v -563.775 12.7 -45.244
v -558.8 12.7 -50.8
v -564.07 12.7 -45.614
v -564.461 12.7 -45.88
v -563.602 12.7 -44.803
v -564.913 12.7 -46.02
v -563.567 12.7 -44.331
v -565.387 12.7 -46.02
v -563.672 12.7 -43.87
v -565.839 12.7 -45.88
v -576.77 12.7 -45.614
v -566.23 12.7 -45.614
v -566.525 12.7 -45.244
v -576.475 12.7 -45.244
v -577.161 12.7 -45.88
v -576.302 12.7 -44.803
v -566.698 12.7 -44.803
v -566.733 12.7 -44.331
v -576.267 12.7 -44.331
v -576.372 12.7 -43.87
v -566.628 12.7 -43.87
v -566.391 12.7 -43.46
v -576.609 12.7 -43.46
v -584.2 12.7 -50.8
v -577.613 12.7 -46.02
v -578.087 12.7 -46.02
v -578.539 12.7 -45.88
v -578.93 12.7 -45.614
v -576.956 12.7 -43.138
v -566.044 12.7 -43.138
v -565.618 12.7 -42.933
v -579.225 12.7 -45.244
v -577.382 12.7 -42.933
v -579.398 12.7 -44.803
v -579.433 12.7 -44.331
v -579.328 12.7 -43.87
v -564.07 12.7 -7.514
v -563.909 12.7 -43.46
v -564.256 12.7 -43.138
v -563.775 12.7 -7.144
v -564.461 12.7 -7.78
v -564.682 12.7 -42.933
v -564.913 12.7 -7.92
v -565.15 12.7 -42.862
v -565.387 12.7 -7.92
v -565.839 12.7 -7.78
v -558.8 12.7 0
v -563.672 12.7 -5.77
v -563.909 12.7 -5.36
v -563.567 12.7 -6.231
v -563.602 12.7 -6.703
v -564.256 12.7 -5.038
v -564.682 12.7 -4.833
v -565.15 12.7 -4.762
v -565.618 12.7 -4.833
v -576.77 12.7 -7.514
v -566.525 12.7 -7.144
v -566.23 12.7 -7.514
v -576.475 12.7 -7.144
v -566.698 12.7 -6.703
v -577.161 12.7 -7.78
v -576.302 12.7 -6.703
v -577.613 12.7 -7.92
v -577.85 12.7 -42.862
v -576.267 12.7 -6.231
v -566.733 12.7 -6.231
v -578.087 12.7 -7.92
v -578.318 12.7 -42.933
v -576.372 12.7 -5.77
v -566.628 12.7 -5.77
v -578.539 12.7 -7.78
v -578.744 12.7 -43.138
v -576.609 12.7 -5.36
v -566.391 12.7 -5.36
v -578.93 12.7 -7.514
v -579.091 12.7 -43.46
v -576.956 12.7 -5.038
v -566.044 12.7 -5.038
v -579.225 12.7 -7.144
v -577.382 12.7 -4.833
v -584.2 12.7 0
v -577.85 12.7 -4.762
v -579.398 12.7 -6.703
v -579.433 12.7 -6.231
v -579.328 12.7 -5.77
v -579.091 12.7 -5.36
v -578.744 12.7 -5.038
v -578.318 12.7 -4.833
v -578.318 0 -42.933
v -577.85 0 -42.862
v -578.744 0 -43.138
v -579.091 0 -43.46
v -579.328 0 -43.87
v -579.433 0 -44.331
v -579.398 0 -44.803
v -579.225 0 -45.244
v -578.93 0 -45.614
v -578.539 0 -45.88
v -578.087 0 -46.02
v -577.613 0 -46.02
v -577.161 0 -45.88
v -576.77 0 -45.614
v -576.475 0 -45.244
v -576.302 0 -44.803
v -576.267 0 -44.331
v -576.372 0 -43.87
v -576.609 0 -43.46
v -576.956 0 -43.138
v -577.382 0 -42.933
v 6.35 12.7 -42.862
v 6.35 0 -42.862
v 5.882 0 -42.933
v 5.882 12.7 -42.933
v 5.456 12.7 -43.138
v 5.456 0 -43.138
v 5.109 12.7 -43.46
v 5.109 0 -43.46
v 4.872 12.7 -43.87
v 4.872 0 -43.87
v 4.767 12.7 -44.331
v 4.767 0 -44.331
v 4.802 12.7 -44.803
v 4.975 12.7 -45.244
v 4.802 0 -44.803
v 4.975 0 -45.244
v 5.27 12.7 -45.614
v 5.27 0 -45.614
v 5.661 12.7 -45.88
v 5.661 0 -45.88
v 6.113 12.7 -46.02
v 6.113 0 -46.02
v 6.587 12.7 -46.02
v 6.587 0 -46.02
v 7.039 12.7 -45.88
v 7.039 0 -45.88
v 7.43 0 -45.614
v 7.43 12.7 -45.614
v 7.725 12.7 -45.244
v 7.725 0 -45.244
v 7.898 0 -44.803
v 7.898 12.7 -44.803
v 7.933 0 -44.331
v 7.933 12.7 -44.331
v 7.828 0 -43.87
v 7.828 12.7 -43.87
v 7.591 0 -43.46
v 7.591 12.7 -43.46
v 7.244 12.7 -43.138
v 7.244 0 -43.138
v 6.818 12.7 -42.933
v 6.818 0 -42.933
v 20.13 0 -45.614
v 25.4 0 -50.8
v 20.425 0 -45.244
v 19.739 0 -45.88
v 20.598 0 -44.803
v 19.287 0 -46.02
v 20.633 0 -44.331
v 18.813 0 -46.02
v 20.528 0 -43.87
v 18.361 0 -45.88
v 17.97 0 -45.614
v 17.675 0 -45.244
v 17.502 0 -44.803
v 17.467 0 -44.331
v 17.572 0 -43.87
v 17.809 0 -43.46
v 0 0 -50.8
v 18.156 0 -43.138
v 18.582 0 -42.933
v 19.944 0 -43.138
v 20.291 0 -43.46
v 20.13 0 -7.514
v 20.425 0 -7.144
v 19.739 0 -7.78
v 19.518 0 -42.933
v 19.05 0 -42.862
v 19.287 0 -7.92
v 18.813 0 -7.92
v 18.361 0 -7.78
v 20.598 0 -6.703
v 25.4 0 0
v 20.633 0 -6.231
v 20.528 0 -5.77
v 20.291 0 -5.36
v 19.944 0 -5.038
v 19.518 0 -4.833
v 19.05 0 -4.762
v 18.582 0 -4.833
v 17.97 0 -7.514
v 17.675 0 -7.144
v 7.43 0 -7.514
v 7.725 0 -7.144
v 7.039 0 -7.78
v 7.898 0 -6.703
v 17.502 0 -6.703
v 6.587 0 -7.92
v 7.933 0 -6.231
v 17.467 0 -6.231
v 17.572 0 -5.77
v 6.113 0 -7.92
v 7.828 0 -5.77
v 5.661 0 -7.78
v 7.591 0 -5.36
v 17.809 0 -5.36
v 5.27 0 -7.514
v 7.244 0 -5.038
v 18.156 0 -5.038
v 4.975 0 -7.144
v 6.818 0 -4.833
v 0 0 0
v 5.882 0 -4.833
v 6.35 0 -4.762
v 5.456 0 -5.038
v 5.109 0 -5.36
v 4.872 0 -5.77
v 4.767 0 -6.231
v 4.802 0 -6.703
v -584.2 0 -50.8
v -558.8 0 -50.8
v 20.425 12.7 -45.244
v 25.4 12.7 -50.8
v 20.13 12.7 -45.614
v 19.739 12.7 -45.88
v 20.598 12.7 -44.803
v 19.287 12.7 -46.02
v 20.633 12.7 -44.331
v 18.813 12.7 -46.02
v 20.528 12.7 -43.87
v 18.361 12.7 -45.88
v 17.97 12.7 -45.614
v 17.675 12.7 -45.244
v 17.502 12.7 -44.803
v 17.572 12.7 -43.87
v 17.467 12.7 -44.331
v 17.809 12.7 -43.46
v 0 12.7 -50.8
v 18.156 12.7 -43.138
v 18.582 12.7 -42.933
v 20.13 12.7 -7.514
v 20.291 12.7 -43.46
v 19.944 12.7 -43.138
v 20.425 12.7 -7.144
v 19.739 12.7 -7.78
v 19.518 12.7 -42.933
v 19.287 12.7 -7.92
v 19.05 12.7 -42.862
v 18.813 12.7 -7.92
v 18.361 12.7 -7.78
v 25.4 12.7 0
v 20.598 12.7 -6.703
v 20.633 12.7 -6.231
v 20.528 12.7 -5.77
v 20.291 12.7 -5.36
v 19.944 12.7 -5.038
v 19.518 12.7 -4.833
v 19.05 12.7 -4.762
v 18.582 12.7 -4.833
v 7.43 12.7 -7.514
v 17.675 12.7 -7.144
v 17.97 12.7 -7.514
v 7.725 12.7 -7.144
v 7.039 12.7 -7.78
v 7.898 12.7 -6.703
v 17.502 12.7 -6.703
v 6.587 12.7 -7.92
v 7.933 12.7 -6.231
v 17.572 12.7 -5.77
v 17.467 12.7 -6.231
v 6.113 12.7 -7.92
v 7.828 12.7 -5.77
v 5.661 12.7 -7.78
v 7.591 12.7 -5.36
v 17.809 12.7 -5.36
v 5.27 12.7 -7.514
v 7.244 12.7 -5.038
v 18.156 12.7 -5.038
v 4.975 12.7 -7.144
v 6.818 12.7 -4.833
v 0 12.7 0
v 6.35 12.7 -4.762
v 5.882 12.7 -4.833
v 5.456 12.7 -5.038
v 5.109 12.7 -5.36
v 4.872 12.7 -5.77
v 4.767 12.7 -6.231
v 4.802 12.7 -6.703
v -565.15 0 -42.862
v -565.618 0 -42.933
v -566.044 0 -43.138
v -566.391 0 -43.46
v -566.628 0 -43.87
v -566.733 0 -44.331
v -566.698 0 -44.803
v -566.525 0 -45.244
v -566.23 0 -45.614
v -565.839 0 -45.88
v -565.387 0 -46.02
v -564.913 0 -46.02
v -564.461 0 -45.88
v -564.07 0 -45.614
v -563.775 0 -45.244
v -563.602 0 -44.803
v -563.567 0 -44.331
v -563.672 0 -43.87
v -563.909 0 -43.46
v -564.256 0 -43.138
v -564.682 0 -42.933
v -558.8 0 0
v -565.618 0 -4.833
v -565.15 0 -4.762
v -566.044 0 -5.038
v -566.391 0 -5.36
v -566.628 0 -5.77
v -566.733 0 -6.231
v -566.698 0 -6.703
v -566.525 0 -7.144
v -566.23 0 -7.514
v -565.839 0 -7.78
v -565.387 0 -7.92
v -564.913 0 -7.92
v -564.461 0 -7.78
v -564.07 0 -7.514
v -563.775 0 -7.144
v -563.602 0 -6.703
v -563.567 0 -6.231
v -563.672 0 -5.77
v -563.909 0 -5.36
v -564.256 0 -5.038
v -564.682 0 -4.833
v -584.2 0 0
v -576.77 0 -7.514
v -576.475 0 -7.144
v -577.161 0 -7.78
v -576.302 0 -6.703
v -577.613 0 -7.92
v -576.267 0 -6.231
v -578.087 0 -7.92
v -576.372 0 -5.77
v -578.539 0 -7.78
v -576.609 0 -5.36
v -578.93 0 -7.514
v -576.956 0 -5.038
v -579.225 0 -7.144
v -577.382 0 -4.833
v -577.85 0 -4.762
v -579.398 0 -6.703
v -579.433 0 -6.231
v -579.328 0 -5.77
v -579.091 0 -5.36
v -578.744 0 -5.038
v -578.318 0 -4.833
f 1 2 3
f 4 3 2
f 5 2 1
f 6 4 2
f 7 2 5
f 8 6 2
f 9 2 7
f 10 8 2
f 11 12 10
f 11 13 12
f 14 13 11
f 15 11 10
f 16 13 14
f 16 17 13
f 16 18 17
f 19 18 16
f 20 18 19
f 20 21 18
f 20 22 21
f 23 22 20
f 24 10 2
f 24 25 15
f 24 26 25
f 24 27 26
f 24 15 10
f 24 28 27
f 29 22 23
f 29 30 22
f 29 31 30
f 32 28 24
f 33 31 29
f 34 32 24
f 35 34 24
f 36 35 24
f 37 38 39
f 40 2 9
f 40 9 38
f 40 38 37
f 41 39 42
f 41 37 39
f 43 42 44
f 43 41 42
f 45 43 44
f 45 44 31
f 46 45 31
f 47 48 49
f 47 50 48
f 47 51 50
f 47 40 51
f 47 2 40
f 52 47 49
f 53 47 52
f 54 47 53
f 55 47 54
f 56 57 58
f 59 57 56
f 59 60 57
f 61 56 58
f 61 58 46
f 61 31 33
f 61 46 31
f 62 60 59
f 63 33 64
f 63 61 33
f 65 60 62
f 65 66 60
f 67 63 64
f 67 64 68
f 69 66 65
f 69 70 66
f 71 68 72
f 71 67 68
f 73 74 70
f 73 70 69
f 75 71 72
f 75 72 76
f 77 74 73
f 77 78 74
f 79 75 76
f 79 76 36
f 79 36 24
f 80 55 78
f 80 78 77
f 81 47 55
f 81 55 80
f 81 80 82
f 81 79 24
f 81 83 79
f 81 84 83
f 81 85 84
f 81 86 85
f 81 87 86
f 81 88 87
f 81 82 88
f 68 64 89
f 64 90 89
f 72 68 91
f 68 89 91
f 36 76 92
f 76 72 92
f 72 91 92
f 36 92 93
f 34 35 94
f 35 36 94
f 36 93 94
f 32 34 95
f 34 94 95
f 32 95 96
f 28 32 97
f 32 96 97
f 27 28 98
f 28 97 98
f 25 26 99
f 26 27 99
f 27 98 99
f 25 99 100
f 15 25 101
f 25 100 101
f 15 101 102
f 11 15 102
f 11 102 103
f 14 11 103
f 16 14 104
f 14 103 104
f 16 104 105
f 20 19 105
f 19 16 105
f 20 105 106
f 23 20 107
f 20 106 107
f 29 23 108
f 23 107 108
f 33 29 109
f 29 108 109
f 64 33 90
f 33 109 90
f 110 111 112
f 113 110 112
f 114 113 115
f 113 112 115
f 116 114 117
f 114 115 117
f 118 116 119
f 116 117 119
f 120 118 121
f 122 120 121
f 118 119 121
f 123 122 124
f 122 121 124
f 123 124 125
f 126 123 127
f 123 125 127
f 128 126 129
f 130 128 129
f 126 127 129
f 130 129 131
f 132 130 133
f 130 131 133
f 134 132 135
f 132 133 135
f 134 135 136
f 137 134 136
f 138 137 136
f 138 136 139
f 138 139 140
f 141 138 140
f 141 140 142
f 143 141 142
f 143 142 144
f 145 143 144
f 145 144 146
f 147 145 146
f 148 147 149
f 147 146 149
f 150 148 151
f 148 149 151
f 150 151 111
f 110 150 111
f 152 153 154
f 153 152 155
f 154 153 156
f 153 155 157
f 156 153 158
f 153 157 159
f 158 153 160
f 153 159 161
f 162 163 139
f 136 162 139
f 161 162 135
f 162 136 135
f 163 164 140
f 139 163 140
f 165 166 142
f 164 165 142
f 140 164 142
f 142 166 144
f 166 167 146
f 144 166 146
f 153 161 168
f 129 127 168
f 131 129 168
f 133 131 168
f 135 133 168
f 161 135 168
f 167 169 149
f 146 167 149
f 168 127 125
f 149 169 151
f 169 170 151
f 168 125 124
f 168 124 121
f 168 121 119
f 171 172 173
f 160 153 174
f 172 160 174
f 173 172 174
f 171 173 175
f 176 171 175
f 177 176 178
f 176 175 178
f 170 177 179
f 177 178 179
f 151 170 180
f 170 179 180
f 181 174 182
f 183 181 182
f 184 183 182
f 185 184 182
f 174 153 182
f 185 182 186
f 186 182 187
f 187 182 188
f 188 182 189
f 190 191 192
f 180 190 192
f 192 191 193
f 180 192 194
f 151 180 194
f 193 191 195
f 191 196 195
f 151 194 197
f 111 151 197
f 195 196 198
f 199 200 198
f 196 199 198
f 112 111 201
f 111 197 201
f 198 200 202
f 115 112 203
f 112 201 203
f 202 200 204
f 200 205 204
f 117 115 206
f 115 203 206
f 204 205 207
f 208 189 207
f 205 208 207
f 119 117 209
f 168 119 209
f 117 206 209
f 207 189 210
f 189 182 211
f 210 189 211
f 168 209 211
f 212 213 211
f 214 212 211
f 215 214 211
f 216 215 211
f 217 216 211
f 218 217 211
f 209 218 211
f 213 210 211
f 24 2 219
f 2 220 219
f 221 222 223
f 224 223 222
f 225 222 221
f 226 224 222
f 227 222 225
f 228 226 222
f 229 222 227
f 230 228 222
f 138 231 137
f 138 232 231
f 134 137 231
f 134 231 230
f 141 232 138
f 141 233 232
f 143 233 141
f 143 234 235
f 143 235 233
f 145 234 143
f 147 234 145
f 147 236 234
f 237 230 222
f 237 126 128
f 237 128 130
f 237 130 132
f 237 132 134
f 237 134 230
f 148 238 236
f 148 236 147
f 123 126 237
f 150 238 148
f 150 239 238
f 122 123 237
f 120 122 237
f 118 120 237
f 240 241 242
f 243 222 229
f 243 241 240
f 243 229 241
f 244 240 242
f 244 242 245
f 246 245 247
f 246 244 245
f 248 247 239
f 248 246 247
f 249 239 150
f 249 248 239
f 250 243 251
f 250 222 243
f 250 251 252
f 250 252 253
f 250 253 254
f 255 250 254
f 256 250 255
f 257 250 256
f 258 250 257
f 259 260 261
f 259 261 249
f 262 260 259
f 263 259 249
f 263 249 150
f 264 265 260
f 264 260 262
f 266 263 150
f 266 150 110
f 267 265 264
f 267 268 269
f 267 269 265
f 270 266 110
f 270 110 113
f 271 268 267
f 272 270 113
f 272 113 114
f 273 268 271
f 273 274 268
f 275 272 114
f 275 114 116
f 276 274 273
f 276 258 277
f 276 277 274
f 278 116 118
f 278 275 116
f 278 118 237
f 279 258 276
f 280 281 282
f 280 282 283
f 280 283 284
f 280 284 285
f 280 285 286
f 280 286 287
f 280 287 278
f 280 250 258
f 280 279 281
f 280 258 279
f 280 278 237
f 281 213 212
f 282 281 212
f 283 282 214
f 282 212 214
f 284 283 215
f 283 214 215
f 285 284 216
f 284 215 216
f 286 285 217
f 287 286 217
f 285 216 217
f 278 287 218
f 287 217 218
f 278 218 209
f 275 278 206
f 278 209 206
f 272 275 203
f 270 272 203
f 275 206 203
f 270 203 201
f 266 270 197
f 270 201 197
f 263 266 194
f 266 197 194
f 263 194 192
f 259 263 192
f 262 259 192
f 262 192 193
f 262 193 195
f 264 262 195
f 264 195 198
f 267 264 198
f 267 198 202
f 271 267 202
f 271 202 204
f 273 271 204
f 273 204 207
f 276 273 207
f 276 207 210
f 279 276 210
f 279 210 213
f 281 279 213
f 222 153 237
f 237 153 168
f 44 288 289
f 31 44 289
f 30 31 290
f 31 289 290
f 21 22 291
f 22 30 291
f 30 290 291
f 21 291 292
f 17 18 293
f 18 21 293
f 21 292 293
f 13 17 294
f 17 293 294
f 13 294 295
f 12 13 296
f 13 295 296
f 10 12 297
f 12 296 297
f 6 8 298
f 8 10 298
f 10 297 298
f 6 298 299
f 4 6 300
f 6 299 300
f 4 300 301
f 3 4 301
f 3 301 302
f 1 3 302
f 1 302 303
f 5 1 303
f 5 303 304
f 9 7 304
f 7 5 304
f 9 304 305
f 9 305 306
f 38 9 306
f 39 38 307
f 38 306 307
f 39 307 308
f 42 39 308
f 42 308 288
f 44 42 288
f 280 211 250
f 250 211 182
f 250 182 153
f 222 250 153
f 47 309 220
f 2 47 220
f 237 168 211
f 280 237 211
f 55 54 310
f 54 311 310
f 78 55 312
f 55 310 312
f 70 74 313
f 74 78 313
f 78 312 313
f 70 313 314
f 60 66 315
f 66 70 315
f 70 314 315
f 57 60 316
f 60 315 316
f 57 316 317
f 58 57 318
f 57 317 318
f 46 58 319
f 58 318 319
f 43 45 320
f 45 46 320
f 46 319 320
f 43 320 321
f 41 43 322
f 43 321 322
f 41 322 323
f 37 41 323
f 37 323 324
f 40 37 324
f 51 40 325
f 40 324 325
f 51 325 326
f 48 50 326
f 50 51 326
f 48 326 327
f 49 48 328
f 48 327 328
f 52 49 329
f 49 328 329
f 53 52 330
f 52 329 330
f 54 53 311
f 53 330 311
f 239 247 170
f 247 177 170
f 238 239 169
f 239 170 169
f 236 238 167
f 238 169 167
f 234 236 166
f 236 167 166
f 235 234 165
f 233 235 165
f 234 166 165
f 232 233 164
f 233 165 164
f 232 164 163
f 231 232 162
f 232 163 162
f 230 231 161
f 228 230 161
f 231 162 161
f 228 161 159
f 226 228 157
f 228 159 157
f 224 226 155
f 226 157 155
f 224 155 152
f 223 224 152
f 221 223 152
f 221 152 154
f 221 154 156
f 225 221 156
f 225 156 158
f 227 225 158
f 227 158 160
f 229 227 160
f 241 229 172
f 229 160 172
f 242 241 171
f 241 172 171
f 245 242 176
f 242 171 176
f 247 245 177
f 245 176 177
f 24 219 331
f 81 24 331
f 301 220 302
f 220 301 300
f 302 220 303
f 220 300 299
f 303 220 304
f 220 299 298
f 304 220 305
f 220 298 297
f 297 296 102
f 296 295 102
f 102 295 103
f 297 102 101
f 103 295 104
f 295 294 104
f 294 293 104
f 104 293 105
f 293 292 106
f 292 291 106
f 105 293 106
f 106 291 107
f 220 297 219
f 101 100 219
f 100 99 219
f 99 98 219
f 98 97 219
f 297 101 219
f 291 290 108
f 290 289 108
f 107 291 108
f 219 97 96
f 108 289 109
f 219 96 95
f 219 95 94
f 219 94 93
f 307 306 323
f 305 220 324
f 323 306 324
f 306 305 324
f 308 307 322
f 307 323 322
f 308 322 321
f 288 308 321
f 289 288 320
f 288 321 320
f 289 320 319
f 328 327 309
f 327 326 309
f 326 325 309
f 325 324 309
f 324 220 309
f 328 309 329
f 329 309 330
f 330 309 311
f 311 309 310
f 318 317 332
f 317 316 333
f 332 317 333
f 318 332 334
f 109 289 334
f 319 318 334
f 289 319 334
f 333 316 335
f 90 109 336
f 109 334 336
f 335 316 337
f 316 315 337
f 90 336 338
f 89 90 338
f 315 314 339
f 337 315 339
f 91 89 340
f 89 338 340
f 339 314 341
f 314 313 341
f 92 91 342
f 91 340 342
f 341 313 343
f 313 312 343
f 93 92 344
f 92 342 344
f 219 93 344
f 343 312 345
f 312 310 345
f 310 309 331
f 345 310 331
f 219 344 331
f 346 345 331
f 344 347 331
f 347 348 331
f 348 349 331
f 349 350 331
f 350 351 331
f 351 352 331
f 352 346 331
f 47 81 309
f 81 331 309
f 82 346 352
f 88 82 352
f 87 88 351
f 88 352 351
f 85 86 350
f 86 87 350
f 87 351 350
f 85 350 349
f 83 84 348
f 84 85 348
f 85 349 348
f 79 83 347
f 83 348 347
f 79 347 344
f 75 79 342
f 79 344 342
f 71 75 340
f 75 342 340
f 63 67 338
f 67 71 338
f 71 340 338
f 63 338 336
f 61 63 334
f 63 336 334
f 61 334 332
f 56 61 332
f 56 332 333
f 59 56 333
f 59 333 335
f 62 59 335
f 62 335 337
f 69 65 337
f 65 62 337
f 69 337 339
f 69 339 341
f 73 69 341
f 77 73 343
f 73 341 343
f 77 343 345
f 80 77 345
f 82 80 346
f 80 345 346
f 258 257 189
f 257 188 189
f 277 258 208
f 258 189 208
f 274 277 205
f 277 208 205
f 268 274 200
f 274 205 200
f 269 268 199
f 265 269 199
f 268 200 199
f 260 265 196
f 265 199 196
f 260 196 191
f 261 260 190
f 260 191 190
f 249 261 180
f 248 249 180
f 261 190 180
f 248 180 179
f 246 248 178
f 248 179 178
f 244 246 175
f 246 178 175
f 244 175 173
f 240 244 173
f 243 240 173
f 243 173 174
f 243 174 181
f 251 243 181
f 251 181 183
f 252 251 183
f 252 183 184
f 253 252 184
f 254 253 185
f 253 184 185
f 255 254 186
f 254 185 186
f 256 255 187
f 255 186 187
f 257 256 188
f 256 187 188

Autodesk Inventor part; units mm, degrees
ref_plane "YZ Plane" through (0, 0, 0) normal (1, 0, 0) x (0, 1, 0)
ref_plane "XZ Plane" through (0, 0, 0) normal (0, 1, 0) x (-1, 0, 0)
sketch "Sketch2" plane through (0, 0, 0) normal (0, 1, 0) x (-1, 0, 0)
  line L0 (0, 0) -> (-25.4, 0)
  line L1 (-25.4, 0) -> (-25.4, -50.8)
  line L2 (-25.4, -50.8) -> (0, -50.8)
  line L3 (0, -50.8) -> (0, 0)
  dimension "d0" = 50.8
  dimension "d4" = 25.4
extrude "Extrusion1" add sketch "Sketch2" along normal blind 12.7
sketch "Sketch4" plane through (0, 12.7, 0) normal (0, 1, 0) x (1, 0, 0)
  line L0 (6.35, 6.35) -> (19.05, 6.35) construction
  line L1 (19.05, 6.35) -> (19.05, 44.45) construction
  line L2 (19.05, 44.45) -> (6.35, 44.45) construction
  line L3 (6.35, 44.45) -> (6.35, 6.35) construction
  line L4 (0, 50.8) -> (0, 0) construction
  line L5 (25.4, 50.8) -> (0, 50.8) construction
  line L6 (0, 0) -> (25.4, 0) construction
  line L7 (25.4, 0) -> (25.4, 50.8) construction
  dimension "d5" = 6.35
  dimension "d6" = 6.35
  dimension "d7" = 6.35
  dimension "d8" = 6.35
hole "Hole1" at (6.35, 12.7, -6.35) at (19.05, 12.7, -6.35) at (19.05, 12.7, -44.45) at (6.35, 12.7, -44.45) direction (0, -1, 0) diameter 3.175 end through all
ref_plane "Work Plane1" through (-279.4, 0, -50.8) normal (-1, 0, 0) x (0, 0, 1)
mirror "Mirror1" about plane through (-279.4, 0, -50.8) normal (-1, 0, 0)
properties part number "Intake - Lexan Raiser"
